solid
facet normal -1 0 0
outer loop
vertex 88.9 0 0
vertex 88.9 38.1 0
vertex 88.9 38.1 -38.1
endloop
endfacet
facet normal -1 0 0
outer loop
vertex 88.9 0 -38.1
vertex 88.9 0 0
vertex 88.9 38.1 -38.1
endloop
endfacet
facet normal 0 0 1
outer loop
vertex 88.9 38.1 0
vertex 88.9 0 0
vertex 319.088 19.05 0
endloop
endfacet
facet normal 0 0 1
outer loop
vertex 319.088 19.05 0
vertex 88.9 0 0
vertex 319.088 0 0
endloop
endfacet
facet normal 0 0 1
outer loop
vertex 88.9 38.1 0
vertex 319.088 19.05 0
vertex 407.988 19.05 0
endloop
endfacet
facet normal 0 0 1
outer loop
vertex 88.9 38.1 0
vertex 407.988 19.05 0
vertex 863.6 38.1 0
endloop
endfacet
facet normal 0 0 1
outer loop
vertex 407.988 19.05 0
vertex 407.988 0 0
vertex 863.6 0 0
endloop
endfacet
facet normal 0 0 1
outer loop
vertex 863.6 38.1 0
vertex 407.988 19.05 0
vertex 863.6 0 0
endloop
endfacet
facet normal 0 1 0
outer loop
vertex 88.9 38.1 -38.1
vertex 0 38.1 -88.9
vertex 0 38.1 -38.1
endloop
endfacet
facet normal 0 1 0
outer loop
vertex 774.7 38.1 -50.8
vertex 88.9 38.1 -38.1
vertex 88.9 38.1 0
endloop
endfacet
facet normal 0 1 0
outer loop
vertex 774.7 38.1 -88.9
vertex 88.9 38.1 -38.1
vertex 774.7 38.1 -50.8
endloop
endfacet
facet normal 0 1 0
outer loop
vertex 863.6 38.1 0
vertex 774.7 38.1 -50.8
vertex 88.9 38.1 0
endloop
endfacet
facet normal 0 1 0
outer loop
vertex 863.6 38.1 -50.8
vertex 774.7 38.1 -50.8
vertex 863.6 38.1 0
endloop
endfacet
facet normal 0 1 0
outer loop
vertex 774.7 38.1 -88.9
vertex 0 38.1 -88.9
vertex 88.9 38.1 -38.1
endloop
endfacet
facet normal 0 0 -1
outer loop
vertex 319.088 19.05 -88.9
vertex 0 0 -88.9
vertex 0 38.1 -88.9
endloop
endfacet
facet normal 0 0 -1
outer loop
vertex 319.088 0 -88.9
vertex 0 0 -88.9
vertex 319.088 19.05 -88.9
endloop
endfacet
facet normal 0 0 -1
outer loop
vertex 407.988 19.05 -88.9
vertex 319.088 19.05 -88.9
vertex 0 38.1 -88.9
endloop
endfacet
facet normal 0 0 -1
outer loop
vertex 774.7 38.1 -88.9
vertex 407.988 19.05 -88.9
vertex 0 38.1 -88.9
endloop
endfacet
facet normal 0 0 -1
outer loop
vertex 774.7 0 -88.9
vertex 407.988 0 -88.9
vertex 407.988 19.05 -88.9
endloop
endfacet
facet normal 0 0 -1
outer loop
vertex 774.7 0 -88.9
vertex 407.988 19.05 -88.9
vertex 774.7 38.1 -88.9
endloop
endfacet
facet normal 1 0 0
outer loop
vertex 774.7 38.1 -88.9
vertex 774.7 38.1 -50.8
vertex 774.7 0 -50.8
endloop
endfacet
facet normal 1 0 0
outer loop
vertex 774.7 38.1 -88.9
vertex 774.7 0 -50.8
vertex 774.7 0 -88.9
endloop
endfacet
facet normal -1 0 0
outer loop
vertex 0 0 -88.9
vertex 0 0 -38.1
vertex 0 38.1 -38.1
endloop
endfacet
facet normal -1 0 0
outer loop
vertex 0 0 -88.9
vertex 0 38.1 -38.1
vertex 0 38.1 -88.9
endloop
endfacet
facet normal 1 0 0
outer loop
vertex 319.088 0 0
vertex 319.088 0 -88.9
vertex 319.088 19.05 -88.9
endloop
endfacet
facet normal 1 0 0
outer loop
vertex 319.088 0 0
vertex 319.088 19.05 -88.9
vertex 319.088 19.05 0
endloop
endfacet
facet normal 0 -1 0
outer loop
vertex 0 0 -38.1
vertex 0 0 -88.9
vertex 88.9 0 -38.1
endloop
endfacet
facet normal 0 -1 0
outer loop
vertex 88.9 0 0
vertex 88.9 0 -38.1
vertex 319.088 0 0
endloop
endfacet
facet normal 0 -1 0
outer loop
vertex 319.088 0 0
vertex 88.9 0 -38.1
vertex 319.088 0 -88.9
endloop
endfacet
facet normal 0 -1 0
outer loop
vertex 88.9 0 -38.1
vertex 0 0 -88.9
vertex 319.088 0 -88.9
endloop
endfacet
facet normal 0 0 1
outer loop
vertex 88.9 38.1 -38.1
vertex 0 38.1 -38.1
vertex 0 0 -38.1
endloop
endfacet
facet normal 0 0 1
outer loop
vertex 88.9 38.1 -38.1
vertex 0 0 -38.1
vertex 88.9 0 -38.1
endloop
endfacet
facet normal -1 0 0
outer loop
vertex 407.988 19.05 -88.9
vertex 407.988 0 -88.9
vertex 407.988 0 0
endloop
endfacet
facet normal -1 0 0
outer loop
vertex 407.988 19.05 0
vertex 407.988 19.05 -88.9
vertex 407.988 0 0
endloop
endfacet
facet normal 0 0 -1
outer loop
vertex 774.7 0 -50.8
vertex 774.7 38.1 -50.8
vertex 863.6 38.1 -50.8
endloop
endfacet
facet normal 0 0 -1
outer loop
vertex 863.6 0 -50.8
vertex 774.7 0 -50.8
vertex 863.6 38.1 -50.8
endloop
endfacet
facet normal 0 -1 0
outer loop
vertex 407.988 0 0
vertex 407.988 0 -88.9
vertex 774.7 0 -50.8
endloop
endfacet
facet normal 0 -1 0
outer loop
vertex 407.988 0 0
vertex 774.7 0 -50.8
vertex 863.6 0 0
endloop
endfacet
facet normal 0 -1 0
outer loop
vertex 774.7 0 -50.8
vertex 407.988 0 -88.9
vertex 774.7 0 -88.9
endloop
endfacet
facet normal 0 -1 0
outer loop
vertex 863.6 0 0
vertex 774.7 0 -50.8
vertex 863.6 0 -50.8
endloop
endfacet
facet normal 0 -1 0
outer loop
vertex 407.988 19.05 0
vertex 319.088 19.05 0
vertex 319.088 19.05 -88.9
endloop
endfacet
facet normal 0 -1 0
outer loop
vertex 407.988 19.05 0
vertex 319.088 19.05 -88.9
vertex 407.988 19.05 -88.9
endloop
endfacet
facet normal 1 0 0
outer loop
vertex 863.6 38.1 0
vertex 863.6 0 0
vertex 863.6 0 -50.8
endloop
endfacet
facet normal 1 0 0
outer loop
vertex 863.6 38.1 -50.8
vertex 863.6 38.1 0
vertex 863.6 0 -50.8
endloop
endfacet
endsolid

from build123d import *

# Parameters (mm, degrees)
SKETCH1_W           = 863.6
SKETCH1_H           = 88.9
BOSS_EXTRUDE1_DEPTH = 38.1
SKETCH2_W           = 88.9
SKETCH2_H           = 88.9
CUT_EXTRUDE1_DEPTH  = 19.05
SKETCH3_W           = 88.9
SKETCH3_H           = 38.1
CUT_EXTRUDE2_DEPTH  = 39.1
SKETCH4_W           = 88.9
SKETCH4_H           = 38.1
CUT_EXTRUDE3_DEPTH  = 39.1


with BuildPart() as part:
    # Sketch1 → Boss-Extrude1 (new body)
    with BuildSketch(Plane(origin=(0, 0, 0), x_dir=(1, 0, 0), z_dir=(0, 1, 0))):
        with Locations((431.8, 44.45)):
            Rectangle(SKETCH1_W, SKETCH1_H)
    extrude(amount=BOSS_EXTRUDE1_DEPTH)

    # Sketch2 → Cut-Extrude1 (cut)
    with BuildSketch(Plane.XZ):
        with Locations((363.5375, -44.45)):
            Rectangle(SKETCH2_W, SKETCH2_H)
    extrude(amount=-CUT_EXTRUDE1_DEPTH, mode=Mode.SUBTRACT)

    # Sketch3 → Cut-Extrude2 (cut, through all)
    with BuildSketch(Plane(origin=(0, 38.1, 0), x_dir=(1, 0, 0), z_dir=(0, 1, 0))):
        with Locations((44.45, 19.05)):
            Rectangle(SKETCH3_W, SKETCH3_H)
    extrude(amount=-CUT_EXTRUDE2_DEPTH, mode=Mode.SUBTRACT)

    # Sketch4 → Cut-Extrude3 (cut, through all)
    with BuildSketch(Plane(origin=(0, 38.1, 0), x_dir=(1, 0, 0), z_dir=(0, 1, 0))):
        with Locations((819.15, 69.85)):
            Rectangle(SKETCH4_W, SKETCH4_H)
    extrude(amount=-CUT_EXTRUDE3_DEPTH, mode=Mode.SUBTRACT)


solid = part.part
